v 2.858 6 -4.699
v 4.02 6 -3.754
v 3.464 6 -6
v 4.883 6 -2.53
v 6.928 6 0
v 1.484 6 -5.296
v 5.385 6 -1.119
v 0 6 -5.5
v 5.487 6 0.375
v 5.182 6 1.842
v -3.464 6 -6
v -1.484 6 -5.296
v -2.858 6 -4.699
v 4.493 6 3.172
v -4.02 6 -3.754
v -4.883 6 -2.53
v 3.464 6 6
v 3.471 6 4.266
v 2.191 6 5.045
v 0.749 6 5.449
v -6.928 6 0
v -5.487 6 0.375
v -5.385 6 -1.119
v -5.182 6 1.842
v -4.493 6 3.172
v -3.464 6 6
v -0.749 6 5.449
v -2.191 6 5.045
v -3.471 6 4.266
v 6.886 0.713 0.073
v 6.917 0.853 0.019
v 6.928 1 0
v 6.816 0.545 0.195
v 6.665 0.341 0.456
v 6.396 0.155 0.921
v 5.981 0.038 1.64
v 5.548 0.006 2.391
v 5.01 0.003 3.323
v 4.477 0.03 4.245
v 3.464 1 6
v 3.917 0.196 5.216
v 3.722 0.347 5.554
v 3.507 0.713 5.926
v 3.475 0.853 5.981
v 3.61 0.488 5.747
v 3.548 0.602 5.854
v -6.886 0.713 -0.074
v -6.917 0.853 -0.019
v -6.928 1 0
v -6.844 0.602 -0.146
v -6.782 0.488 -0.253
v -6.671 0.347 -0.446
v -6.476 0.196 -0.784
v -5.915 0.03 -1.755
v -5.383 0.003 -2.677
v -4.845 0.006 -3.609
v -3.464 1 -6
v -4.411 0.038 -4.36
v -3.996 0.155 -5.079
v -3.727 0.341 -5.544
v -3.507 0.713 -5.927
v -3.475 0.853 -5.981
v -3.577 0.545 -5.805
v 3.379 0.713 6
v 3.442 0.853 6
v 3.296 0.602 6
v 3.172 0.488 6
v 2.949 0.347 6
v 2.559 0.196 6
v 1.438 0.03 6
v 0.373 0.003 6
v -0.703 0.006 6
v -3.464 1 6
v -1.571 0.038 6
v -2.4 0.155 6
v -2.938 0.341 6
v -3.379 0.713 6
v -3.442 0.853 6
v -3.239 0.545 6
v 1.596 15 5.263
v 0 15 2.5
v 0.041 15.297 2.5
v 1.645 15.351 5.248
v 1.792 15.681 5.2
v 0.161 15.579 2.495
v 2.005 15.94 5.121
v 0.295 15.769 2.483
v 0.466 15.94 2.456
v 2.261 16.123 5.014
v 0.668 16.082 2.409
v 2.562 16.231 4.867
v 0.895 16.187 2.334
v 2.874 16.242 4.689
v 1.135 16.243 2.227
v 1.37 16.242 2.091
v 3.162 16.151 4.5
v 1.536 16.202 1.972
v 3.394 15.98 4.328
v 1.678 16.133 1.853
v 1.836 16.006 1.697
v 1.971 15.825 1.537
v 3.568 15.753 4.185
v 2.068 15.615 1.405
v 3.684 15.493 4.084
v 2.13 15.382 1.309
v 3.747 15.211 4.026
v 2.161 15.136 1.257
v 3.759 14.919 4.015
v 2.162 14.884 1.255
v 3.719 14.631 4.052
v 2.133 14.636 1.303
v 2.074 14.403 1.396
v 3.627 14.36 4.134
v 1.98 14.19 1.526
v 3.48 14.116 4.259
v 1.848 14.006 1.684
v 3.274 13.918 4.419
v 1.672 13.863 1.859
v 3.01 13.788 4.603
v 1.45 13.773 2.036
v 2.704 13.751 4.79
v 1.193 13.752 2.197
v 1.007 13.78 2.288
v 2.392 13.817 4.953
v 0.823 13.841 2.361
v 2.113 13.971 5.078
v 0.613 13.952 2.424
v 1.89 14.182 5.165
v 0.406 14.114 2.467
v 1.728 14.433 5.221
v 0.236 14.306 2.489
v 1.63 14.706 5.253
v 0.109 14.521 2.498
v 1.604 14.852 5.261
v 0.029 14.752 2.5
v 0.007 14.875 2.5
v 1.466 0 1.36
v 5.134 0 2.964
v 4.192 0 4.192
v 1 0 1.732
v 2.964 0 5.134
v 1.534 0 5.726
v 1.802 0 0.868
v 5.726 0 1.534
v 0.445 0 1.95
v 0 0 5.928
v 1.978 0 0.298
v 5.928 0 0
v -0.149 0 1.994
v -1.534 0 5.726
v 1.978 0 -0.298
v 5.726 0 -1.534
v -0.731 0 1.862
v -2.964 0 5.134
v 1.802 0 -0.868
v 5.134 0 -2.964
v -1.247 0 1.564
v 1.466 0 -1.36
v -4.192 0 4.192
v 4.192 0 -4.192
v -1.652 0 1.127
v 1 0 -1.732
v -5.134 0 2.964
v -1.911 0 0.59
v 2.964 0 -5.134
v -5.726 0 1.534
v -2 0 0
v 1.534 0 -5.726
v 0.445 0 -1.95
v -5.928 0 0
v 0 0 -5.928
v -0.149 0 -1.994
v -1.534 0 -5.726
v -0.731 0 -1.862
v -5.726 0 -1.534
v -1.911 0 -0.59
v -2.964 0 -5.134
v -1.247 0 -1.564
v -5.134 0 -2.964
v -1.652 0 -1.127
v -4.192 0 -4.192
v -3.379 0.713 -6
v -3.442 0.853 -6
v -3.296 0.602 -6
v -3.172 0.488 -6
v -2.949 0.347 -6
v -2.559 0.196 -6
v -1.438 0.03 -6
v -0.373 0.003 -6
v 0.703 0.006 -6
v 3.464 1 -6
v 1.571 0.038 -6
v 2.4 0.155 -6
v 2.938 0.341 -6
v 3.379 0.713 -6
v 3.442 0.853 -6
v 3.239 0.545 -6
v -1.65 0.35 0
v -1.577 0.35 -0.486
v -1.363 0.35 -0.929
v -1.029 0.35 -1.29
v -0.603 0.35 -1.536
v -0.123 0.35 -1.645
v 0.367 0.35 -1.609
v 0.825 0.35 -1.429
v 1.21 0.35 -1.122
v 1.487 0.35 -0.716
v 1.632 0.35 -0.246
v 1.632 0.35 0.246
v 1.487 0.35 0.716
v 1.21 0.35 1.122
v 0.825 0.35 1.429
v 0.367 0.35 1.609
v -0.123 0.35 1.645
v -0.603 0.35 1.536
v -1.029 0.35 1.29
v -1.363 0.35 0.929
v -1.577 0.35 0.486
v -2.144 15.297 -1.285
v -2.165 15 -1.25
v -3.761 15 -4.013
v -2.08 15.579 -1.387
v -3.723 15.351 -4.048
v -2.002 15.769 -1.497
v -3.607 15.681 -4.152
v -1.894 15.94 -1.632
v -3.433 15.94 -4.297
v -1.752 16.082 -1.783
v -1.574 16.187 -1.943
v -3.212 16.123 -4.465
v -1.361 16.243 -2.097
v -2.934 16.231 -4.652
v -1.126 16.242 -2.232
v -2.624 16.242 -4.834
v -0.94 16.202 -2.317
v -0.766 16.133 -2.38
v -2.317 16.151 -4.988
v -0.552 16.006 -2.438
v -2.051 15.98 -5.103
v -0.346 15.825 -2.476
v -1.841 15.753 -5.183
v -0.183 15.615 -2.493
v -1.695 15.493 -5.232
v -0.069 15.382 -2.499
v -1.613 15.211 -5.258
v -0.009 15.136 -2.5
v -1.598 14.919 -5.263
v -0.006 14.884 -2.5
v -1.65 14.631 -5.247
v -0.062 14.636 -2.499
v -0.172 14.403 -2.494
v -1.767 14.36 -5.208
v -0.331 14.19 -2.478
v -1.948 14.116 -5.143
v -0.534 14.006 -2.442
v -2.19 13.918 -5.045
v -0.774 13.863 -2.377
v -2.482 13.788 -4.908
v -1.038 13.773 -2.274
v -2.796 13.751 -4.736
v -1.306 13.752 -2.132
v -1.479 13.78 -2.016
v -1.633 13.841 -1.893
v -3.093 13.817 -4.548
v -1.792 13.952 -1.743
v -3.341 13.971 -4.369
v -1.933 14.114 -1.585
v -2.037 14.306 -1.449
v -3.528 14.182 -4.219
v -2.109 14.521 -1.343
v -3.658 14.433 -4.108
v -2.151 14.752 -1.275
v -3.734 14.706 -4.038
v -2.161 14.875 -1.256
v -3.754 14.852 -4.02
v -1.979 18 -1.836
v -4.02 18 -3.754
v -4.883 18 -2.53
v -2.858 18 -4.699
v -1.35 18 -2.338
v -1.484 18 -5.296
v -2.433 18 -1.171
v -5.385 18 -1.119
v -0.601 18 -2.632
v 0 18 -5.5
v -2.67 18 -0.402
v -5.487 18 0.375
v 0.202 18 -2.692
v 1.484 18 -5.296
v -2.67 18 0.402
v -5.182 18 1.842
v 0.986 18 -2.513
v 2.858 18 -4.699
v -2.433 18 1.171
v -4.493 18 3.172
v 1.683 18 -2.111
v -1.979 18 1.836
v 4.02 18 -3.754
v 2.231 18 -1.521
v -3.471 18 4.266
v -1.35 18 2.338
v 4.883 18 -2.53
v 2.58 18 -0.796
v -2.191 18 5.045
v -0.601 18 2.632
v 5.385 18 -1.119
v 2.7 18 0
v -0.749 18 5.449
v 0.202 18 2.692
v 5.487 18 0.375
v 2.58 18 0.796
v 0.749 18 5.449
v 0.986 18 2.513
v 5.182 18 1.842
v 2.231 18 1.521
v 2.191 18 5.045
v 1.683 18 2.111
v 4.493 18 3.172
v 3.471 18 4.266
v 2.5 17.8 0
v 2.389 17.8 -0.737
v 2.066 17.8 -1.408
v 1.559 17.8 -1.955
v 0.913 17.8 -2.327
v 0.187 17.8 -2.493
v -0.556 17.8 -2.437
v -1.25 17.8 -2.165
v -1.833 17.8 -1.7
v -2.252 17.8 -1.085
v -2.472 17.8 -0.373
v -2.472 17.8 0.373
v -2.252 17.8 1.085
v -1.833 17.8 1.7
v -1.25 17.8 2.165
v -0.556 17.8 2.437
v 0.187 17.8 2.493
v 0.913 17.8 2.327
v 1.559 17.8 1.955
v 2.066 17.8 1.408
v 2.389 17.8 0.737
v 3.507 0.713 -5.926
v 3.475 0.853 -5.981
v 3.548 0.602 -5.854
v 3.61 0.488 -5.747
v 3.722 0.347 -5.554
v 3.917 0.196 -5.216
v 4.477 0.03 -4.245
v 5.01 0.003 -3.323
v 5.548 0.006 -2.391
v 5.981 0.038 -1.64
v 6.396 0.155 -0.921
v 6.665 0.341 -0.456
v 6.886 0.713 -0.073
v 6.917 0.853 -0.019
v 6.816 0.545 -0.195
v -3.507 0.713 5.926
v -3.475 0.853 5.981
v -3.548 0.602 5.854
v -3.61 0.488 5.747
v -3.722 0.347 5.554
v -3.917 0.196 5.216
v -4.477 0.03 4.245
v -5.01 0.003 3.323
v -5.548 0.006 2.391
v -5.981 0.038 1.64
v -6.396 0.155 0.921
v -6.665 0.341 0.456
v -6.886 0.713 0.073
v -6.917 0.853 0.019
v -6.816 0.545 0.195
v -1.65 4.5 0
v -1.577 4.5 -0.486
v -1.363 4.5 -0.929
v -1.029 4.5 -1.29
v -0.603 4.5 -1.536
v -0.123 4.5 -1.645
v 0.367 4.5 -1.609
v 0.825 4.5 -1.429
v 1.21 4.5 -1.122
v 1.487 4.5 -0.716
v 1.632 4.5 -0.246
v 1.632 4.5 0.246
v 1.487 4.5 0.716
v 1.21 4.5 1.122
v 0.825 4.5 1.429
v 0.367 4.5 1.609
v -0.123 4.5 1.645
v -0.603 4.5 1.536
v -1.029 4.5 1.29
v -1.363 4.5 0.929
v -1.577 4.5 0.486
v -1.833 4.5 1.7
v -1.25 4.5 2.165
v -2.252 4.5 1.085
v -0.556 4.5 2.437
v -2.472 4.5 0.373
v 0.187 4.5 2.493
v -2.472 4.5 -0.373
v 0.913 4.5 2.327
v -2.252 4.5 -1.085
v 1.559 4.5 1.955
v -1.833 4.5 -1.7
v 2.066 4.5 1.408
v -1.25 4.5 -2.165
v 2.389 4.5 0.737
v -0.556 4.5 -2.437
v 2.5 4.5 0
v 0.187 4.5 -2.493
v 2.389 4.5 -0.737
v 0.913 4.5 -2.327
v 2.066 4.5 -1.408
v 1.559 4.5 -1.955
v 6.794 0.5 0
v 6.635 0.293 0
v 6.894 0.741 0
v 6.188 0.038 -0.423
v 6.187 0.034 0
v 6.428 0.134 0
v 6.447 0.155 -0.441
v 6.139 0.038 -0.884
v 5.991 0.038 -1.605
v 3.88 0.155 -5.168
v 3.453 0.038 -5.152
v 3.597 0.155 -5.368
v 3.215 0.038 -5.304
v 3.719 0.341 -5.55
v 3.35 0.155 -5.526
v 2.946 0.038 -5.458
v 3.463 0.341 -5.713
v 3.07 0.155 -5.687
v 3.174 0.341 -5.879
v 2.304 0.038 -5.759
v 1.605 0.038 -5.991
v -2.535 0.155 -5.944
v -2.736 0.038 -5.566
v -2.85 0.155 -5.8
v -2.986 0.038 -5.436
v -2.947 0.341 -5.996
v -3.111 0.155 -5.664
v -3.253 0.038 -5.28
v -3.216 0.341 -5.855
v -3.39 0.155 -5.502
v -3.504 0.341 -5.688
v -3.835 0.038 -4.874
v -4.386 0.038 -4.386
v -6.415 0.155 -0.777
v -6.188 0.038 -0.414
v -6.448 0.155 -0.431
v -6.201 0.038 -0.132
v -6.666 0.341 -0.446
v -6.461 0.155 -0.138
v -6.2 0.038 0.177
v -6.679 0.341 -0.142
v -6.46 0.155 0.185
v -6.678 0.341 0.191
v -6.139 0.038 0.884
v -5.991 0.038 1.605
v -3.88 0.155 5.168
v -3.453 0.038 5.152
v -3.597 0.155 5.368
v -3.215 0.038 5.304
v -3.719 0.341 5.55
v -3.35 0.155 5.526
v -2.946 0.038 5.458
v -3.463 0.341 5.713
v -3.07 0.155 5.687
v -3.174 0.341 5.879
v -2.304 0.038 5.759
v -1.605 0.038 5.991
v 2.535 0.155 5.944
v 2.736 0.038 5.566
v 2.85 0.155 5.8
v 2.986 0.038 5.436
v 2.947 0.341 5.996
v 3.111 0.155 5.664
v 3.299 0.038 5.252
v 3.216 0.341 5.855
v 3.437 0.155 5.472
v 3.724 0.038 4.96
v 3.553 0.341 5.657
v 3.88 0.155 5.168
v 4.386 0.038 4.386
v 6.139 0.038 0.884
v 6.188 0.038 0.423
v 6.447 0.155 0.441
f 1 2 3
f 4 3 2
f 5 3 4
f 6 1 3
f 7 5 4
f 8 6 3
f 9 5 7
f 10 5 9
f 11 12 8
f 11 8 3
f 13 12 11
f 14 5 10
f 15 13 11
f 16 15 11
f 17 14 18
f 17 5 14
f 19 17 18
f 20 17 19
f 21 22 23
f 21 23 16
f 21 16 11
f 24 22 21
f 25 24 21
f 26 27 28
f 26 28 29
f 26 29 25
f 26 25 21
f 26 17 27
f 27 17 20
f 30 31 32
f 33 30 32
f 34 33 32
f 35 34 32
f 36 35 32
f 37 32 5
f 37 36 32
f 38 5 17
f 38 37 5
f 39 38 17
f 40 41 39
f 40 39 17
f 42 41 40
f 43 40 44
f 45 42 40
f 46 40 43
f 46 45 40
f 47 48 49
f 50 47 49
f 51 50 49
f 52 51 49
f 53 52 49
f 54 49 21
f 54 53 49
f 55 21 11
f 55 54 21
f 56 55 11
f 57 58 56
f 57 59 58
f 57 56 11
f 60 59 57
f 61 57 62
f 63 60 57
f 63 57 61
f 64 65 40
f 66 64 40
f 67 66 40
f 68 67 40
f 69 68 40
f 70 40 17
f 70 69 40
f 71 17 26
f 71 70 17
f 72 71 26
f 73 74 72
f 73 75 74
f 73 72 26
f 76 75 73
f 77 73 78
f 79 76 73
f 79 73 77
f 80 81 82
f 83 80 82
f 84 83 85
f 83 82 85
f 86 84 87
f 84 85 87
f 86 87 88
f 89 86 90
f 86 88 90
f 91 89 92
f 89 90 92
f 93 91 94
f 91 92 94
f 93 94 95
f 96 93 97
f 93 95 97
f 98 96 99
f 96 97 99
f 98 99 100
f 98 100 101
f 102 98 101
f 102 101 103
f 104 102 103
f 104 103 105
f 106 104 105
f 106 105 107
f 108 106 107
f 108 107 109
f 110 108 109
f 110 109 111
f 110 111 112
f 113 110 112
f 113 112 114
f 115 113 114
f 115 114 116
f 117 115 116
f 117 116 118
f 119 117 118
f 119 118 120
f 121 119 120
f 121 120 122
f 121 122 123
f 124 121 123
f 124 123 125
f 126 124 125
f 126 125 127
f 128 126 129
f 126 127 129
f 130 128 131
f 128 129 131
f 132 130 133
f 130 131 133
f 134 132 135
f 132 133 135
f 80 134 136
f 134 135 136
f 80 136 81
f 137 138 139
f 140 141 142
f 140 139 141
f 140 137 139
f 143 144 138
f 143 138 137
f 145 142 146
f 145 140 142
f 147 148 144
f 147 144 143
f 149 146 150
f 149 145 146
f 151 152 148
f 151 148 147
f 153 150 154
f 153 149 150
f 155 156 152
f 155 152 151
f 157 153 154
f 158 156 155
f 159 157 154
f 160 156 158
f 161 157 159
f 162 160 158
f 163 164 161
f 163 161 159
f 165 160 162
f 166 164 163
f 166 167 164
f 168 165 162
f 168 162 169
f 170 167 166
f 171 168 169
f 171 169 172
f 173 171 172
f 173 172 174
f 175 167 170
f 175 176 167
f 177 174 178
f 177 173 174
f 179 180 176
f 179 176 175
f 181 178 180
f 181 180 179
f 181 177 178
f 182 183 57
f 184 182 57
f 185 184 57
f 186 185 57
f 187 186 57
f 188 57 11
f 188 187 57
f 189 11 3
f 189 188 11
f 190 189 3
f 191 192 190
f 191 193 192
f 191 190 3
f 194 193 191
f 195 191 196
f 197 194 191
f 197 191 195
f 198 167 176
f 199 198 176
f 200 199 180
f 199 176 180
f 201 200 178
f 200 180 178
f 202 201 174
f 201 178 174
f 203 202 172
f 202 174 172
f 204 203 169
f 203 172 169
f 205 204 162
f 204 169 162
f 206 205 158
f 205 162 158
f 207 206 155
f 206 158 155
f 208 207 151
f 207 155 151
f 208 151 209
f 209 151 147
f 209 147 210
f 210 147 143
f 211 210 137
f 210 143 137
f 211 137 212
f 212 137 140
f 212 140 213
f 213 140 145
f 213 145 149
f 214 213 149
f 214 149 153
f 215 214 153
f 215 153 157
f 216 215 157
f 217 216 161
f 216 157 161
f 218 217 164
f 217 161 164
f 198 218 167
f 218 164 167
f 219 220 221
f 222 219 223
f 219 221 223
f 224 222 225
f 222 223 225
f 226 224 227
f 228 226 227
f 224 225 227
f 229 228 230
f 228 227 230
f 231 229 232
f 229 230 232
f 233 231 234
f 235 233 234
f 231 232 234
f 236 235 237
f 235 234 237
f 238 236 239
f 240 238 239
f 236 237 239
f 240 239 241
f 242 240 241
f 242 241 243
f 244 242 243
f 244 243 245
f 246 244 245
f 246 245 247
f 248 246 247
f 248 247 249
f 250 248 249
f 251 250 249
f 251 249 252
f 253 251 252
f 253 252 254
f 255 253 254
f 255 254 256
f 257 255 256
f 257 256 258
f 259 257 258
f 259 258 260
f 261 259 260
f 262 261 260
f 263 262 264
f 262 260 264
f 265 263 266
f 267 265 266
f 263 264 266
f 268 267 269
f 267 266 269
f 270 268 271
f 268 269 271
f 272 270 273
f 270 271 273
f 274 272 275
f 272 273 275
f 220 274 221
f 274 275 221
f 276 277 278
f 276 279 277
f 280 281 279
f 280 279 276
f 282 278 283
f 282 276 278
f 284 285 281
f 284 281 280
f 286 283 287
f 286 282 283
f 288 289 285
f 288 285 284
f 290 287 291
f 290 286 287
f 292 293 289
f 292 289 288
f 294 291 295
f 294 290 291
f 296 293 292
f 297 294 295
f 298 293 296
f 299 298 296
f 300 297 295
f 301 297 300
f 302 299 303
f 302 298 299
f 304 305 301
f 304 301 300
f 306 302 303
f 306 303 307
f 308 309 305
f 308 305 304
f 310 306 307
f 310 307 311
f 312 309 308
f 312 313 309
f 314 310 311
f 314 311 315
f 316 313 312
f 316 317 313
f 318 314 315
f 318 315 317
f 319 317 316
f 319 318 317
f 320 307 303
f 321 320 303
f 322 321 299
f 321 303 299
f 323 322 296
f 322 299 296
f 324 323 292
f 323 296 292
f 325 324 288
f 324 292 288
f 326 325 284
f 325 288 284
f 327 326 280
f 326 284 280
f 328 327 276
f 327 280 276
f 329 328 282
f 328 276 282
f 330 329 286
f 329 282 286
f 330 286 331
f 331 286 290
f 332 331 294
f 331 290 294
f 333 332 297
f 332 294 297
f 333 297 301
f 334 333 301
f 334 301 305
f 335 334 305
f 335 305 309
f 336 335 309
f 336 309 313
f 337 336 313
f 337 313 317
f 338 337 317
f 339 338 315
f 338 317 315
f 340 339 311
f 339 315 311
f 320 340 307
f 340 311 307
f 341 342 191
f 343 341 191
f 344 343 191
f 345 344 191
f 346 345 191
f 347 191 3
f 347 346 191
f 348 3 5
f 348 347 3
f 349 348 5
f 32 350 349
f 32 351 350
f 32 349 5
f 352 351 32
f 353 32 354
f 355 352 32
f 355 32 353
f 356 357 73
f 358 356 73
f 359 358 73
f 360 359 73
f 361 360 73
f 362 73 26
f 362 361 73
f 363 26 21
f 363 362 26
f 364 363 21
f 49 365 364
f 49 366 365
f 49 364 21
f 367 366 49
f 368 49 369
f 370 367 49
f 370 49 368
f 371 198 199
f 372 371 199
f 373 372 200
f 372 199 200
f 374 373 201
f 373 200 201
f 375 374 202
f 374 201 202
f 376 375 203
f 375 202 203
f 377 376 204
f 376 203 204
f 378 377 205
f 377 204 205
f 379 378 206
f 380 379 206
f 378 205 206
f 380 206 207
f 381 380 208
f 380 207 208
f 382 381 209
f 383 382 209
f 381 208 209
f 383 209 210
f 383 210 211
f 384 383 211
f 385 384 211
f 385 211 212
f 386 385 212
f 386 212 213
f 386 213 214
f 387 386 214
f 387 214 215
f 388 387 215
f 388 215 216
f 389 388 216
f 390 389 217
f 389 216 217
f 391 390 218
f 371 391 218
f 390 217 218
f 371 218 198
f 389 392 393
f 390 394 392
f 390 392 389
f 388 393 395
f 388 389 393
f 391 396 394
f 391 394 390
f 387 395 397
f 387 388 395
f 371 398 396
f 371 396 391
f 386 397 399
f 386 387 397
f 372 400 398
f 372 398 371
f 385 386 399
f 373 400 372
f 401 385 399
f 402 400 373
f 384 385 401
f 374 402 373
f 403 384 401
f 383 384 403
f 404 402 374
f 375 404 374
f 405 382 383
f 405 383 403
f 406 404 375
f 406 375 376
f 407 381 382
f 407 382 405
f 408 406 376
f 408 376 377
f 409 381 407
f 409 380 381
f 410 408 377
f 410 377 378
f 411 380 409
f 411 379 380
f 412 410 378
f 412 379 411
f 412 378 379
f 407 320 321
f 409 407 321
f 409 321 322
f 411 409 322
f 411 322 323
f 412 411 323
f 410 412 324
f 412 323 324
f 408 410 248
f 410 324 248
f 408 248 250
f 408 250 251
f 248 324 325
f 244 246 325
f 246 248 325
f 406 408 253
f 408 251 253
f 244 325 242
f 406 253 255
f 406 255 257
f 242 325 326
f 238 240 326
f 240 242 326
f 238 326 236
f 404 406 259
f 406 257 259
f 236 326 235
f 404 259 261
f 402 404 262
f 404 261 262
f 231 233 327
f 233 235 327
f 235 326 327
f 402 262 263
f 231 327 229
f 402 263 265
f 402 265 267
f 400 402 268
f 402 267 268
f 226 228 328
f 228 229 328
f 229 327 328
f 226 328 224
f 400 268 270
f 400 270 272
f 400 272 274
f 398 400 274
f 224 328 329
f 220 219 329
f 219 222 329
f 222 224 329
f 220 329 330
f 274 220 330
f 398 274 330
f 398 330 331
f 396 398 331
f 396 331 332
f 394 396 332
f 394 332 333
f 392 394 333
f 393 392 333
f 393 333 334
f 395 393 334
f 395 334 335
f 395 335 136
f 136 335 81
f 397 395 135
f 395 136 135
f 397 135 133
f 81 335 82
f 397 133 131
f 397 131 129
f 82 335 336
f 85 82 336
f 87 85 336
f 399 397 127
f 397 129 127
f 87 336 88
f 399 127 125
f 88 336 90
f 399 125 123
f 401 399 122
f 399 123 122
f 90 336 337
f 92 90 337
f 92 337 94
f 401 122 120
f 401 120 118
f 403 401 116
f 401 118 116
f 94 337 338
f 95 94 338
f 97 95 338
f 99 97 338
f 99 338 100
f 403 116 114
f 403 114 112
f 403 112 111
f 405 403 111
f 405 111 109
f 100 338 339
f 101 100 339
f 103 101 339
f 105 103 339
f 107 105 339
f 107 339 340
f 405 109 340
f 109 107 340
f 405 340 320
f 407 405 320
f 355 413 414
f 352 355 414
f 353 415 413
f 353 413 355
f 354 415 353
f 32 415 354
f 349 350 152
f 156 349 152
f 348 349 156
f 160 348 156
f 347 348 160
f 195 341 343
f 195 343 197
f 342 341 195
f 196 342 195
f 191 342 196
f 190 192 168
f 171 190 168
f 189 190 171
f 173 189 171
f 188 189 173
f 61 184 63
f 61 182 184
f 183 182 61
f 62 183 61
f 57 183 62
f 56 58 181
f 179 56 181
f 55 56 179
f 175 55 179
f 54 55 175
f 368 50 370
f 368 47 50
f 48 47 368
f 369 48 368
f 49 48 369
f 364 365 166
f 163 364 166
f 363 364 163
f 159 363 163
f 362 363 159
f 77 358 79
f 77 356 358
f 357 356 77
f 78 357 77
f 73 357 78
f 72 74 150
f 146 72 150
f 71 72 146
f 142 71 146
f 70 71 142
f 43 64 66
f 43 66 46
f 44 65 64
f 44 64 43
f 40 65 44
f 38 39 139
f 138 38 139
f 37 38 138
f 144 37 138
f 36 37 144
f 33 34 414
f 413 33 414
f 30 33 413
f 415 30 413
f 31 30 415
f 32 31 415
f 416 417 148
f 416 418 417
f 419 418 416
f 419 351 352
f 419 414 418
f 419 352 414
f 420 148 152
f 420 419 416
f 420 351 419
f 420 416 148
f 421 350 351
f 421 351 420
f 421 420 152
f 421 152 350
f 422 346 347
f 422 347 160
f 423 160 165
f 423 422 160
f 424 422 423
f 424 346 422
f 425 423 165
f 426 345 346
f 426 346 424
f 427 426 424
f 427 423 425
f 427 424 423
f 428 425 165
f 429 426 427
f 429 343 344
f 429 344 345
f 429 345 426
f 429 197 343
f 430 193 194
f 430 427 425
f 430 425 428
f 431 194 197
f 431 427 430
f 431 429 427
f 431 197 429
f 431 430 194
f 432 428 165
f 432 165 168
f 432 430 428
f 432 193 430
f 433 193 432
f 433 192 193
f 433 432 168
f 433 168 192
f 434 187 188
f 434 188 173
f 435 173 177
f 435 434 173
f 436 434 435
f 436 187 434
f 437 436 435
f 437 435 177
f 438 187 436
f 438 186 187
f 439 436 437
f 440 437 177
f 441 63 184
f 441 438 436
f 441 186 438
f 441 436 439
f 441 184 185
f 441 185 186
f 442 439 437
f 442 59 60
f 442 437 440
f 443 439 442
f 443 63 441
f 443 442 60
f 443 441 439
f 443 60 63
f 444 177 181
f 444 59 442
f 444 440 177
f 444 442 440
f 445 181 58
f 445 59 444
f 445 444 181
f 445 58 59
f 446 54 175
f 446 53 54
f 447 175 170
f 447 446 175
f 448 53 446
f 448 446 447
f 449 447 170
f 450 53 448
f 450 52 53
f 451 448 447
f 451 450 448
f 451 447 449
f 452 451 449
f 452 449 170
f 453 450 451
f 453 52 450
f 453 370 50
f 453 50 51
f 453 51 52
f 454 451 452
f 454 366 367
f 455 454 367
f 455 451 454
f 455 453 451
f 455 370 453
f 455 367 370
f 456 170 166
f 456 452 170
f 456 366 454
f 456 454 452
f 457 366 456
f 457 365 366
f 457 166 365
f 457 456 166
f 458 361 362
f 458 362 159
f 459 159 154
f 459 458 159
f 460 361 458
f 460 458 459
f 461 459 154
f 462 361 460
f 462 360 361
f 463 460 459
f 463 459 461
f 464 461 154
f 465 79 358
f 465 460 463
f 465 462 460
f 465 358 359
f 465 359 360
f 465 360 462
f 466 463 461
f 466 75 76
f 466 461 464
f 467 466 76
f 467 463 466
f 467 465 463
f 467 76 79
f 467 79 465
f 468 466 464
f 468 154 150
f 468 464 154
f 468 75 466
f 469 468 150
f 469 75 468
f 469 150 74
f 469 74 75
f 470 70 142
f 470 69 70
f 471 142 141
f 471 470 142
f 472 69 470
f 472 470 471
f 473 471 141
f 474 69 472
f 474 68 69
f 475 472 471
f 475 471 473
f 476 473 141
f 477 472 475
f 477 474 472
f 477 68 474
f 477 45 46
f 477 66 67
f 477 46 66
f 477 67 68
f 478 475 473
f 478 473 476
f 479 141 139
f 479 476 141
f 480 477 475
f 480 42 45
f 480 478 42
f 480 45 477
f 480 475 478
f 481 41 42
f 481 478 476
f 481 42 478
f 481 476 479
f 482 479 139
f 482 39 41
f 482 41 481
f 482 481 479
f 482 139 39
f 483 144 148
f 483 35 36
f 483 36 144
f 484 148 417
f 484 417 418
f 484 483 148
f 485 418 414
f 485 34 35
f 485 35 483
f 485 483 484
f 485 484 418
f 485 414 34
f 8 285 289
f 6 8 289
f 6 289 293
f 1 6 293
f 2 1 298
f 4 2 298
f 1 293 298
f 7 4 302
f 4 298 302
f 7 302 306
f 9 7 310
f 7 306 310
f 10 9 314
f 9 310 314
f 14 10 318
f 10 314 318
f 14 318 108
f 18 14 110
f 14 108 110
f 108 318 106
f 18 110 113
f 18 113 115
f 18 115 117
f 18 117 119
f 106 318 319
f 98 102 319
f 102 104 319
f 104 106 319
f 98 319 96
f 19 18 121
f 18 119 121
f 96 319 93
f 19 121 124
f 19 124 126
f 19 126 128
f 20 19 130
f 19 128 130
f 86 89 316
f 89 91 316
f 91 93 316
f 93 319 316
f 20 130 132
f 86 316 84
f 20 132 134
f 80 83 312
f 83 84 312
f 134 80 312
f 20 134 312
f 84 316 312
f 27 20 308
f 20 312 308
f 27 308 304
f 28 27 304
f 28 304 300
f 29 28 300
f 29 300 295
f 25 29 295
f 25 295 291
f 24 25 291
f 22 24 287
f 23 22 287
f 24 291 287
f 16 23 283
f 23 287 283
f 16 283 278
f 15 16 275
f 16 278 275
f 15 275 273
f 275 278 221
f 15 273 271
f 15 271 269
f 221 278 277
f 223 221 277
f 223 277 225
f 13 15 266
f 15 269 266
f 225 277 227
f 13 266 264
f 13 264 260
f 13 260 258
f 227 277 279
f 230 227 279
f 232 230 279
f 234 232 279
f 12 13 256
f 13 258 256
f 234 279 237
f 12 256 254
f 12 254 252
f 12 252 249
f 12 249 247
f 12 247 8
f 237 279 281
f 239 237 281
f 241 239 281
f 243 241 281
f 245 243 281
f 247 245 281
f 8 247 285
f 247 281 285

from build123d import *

# Parameters (mm, degrees)
BOSS_EXTRUDE1_DEPTH                              = 5
BOSS_EXTRUDE1_START                              = 0.002576877
BOSS_EXTRUDE1_3_OUTLINE_W                        = 16
BOSS_EXTRUDE1_3_OUTLINE_H                        = 16
BOSS_EXTRUDE1_3_DEPTH                            = 0.997423124
SKETCH2_W                                        = 5.5
SKETCH2_H                                        = 12
CBORE_FOR_M3_HEX_HEAD_MACHINE_SCREW1_D           = 3.3
CBORE_FOR_M3_HEX_HEAD_MACHINE_SCREW1_DEPTH       = 18.260356386
CBORE_FOR_M3_HEX_HEAD_MACHINE_SCREW1_CBORE_D     = 5
CBORE_FOR_M3_HEX_HEAD_MACHINE_SCREW1_CBORE_DEPTH = 13.5
F_2_5_2_5_DIAMETER_HOLE1_D                       = 2.5
F_2_5_2_5_DIAMETER_HOLE1_DEPTH                   = 14.334936491
CHAMFER1_SIZE                                    = 0.2
CHAMFER2_SIZE                                    = 0.35


with BuildPart() as part:
    # Boss-Extrude1: read off the stored shape, not the designer's step
    # Boss-Extrude1 outline → Boss-Extrude1 (new body)
    with BuildSketch(Plane(origin=(0, 1, 0), x_dir=(-1, 0, 0), z_dir=(0, 1, 0))):
        Polygon((3.464101615, 6), (-3.464101615, 6), (-6.92820323, 0), (-3.464101615, -6), (3.464101615, -6), (6.92820323, 0), align=None)
    extrude(amount=BOSS_EXTRUDE1_DEPTH)

    # Boss-Extrude1 2 outline → Boss-Extrude1 2 (revolve)
    with BuildSketch(Plane.XY):
        with BuildLine():
            Line((0, 1.000000001), (0, 0))
            Line((0, 0), (5.92820323, 0))
            ThreePointArc((5.92820323, 0), (6.635310012, 0.292893219), (6.92820323, 1.000000001))
            Line((6.92820323, 1.000000001), (0, 1.000000001))
        make_face()
    revolve(axis=Axis((0, 0, 0), (0, 1, 0)))

    # Boss-Extrude1 3 outline → Boss-Extrude1 3 (cut)
    with BuildSketch(Plane(origin=(0, 0, 0), x_dir=(1, 0, 0), z_dir=(0, 1, 0)).offset(BOSS_EXTRUDE1_START)):
        Rectangle(BOSS_EXTRUDE1_3_OUTLINE_W, BOSS_EXTRUDE1_3_OUTLINE_H)
        Polygon((6.92820323, 0), (3.464101615, -6), (-3.464101615, -6), (-6.92820323, 0), (-3.464101615, 6), (3.464101615, 6), align=None, mode=Mode.SUBTRACT)
    extrude(amount=BOSS_EXTRUDE1_3_DEPTH, mode=Mode.SUBTRACT)

    # Sketch2 → Revolve1 (revolve)
    with BuildSketch(Plane.XY, mode=Mode.PRIVATE) as revolve1_sk:
        with Locations((2.75, 12)):
            Rectangle(SKETCH2_W, SKETCH2_H)
    revolve(revolve1_sk.sketch.rotate(Axis((0, 18, 0), (0, -1, 0)), 270), axis=Axis((0, 18, 0), (0, -1, 0)))

    # CBORE for M3 Hex Head Machine Screw1
    with Locations(Plane(origin=(0, 18, 0), x_dir=(1, 0, 0), z_dir=(0, 1, 0))):
        with Locations((0, 0)):
            CounterBoreHole(CBORE_FOR_M3_HEX_HEAD_MACHINE_SCREW1_D / 2, CBORE_FOR_M3_HEX_HEAD_MACHINE_SCREW1_CBORE_D / 2, CBORE_FOR_M3_HEX_HEAD_MACHINE_SCREW1_CBORE_DEPTH, depth=CBORE_FOR_M3_HEX_HEAD_MACHINE_SCREW1_DEPTH)

    # Ø2.5 (2.5) Diameter Hole1
    with Locations(Plane(origin=(2.75, 15, 4.763139721), x_dir=(0.866025403784, 0, -0.5), z_dir=(0.5, 0, 0.866025403784))):
        with Locations((0, 0)):
            Hole(F_2_5_2_5_DIAMETER_HOLE1_D / 2, depth=F_2_5_2_5_DIAMETER_HOLE1_DEPTH)

    # Chamfer1
    chamfer1_edges = [part.edges().sort_by_distance(p)[0] for p in [
        (-2.5, 18, 0),
    ]]
    chamfer(chamfer1_edges, length=CHAMFER1_SIZE)

    # Chamfer2
    chamfer2_edges = [part.edges().sort_by_distance(p)[0] for p in [
        (1.65, 0, 0),
    ]]
    chamfer(chamfer2_edges, length=CHAMFER2_SIZE)


solid = part.part
